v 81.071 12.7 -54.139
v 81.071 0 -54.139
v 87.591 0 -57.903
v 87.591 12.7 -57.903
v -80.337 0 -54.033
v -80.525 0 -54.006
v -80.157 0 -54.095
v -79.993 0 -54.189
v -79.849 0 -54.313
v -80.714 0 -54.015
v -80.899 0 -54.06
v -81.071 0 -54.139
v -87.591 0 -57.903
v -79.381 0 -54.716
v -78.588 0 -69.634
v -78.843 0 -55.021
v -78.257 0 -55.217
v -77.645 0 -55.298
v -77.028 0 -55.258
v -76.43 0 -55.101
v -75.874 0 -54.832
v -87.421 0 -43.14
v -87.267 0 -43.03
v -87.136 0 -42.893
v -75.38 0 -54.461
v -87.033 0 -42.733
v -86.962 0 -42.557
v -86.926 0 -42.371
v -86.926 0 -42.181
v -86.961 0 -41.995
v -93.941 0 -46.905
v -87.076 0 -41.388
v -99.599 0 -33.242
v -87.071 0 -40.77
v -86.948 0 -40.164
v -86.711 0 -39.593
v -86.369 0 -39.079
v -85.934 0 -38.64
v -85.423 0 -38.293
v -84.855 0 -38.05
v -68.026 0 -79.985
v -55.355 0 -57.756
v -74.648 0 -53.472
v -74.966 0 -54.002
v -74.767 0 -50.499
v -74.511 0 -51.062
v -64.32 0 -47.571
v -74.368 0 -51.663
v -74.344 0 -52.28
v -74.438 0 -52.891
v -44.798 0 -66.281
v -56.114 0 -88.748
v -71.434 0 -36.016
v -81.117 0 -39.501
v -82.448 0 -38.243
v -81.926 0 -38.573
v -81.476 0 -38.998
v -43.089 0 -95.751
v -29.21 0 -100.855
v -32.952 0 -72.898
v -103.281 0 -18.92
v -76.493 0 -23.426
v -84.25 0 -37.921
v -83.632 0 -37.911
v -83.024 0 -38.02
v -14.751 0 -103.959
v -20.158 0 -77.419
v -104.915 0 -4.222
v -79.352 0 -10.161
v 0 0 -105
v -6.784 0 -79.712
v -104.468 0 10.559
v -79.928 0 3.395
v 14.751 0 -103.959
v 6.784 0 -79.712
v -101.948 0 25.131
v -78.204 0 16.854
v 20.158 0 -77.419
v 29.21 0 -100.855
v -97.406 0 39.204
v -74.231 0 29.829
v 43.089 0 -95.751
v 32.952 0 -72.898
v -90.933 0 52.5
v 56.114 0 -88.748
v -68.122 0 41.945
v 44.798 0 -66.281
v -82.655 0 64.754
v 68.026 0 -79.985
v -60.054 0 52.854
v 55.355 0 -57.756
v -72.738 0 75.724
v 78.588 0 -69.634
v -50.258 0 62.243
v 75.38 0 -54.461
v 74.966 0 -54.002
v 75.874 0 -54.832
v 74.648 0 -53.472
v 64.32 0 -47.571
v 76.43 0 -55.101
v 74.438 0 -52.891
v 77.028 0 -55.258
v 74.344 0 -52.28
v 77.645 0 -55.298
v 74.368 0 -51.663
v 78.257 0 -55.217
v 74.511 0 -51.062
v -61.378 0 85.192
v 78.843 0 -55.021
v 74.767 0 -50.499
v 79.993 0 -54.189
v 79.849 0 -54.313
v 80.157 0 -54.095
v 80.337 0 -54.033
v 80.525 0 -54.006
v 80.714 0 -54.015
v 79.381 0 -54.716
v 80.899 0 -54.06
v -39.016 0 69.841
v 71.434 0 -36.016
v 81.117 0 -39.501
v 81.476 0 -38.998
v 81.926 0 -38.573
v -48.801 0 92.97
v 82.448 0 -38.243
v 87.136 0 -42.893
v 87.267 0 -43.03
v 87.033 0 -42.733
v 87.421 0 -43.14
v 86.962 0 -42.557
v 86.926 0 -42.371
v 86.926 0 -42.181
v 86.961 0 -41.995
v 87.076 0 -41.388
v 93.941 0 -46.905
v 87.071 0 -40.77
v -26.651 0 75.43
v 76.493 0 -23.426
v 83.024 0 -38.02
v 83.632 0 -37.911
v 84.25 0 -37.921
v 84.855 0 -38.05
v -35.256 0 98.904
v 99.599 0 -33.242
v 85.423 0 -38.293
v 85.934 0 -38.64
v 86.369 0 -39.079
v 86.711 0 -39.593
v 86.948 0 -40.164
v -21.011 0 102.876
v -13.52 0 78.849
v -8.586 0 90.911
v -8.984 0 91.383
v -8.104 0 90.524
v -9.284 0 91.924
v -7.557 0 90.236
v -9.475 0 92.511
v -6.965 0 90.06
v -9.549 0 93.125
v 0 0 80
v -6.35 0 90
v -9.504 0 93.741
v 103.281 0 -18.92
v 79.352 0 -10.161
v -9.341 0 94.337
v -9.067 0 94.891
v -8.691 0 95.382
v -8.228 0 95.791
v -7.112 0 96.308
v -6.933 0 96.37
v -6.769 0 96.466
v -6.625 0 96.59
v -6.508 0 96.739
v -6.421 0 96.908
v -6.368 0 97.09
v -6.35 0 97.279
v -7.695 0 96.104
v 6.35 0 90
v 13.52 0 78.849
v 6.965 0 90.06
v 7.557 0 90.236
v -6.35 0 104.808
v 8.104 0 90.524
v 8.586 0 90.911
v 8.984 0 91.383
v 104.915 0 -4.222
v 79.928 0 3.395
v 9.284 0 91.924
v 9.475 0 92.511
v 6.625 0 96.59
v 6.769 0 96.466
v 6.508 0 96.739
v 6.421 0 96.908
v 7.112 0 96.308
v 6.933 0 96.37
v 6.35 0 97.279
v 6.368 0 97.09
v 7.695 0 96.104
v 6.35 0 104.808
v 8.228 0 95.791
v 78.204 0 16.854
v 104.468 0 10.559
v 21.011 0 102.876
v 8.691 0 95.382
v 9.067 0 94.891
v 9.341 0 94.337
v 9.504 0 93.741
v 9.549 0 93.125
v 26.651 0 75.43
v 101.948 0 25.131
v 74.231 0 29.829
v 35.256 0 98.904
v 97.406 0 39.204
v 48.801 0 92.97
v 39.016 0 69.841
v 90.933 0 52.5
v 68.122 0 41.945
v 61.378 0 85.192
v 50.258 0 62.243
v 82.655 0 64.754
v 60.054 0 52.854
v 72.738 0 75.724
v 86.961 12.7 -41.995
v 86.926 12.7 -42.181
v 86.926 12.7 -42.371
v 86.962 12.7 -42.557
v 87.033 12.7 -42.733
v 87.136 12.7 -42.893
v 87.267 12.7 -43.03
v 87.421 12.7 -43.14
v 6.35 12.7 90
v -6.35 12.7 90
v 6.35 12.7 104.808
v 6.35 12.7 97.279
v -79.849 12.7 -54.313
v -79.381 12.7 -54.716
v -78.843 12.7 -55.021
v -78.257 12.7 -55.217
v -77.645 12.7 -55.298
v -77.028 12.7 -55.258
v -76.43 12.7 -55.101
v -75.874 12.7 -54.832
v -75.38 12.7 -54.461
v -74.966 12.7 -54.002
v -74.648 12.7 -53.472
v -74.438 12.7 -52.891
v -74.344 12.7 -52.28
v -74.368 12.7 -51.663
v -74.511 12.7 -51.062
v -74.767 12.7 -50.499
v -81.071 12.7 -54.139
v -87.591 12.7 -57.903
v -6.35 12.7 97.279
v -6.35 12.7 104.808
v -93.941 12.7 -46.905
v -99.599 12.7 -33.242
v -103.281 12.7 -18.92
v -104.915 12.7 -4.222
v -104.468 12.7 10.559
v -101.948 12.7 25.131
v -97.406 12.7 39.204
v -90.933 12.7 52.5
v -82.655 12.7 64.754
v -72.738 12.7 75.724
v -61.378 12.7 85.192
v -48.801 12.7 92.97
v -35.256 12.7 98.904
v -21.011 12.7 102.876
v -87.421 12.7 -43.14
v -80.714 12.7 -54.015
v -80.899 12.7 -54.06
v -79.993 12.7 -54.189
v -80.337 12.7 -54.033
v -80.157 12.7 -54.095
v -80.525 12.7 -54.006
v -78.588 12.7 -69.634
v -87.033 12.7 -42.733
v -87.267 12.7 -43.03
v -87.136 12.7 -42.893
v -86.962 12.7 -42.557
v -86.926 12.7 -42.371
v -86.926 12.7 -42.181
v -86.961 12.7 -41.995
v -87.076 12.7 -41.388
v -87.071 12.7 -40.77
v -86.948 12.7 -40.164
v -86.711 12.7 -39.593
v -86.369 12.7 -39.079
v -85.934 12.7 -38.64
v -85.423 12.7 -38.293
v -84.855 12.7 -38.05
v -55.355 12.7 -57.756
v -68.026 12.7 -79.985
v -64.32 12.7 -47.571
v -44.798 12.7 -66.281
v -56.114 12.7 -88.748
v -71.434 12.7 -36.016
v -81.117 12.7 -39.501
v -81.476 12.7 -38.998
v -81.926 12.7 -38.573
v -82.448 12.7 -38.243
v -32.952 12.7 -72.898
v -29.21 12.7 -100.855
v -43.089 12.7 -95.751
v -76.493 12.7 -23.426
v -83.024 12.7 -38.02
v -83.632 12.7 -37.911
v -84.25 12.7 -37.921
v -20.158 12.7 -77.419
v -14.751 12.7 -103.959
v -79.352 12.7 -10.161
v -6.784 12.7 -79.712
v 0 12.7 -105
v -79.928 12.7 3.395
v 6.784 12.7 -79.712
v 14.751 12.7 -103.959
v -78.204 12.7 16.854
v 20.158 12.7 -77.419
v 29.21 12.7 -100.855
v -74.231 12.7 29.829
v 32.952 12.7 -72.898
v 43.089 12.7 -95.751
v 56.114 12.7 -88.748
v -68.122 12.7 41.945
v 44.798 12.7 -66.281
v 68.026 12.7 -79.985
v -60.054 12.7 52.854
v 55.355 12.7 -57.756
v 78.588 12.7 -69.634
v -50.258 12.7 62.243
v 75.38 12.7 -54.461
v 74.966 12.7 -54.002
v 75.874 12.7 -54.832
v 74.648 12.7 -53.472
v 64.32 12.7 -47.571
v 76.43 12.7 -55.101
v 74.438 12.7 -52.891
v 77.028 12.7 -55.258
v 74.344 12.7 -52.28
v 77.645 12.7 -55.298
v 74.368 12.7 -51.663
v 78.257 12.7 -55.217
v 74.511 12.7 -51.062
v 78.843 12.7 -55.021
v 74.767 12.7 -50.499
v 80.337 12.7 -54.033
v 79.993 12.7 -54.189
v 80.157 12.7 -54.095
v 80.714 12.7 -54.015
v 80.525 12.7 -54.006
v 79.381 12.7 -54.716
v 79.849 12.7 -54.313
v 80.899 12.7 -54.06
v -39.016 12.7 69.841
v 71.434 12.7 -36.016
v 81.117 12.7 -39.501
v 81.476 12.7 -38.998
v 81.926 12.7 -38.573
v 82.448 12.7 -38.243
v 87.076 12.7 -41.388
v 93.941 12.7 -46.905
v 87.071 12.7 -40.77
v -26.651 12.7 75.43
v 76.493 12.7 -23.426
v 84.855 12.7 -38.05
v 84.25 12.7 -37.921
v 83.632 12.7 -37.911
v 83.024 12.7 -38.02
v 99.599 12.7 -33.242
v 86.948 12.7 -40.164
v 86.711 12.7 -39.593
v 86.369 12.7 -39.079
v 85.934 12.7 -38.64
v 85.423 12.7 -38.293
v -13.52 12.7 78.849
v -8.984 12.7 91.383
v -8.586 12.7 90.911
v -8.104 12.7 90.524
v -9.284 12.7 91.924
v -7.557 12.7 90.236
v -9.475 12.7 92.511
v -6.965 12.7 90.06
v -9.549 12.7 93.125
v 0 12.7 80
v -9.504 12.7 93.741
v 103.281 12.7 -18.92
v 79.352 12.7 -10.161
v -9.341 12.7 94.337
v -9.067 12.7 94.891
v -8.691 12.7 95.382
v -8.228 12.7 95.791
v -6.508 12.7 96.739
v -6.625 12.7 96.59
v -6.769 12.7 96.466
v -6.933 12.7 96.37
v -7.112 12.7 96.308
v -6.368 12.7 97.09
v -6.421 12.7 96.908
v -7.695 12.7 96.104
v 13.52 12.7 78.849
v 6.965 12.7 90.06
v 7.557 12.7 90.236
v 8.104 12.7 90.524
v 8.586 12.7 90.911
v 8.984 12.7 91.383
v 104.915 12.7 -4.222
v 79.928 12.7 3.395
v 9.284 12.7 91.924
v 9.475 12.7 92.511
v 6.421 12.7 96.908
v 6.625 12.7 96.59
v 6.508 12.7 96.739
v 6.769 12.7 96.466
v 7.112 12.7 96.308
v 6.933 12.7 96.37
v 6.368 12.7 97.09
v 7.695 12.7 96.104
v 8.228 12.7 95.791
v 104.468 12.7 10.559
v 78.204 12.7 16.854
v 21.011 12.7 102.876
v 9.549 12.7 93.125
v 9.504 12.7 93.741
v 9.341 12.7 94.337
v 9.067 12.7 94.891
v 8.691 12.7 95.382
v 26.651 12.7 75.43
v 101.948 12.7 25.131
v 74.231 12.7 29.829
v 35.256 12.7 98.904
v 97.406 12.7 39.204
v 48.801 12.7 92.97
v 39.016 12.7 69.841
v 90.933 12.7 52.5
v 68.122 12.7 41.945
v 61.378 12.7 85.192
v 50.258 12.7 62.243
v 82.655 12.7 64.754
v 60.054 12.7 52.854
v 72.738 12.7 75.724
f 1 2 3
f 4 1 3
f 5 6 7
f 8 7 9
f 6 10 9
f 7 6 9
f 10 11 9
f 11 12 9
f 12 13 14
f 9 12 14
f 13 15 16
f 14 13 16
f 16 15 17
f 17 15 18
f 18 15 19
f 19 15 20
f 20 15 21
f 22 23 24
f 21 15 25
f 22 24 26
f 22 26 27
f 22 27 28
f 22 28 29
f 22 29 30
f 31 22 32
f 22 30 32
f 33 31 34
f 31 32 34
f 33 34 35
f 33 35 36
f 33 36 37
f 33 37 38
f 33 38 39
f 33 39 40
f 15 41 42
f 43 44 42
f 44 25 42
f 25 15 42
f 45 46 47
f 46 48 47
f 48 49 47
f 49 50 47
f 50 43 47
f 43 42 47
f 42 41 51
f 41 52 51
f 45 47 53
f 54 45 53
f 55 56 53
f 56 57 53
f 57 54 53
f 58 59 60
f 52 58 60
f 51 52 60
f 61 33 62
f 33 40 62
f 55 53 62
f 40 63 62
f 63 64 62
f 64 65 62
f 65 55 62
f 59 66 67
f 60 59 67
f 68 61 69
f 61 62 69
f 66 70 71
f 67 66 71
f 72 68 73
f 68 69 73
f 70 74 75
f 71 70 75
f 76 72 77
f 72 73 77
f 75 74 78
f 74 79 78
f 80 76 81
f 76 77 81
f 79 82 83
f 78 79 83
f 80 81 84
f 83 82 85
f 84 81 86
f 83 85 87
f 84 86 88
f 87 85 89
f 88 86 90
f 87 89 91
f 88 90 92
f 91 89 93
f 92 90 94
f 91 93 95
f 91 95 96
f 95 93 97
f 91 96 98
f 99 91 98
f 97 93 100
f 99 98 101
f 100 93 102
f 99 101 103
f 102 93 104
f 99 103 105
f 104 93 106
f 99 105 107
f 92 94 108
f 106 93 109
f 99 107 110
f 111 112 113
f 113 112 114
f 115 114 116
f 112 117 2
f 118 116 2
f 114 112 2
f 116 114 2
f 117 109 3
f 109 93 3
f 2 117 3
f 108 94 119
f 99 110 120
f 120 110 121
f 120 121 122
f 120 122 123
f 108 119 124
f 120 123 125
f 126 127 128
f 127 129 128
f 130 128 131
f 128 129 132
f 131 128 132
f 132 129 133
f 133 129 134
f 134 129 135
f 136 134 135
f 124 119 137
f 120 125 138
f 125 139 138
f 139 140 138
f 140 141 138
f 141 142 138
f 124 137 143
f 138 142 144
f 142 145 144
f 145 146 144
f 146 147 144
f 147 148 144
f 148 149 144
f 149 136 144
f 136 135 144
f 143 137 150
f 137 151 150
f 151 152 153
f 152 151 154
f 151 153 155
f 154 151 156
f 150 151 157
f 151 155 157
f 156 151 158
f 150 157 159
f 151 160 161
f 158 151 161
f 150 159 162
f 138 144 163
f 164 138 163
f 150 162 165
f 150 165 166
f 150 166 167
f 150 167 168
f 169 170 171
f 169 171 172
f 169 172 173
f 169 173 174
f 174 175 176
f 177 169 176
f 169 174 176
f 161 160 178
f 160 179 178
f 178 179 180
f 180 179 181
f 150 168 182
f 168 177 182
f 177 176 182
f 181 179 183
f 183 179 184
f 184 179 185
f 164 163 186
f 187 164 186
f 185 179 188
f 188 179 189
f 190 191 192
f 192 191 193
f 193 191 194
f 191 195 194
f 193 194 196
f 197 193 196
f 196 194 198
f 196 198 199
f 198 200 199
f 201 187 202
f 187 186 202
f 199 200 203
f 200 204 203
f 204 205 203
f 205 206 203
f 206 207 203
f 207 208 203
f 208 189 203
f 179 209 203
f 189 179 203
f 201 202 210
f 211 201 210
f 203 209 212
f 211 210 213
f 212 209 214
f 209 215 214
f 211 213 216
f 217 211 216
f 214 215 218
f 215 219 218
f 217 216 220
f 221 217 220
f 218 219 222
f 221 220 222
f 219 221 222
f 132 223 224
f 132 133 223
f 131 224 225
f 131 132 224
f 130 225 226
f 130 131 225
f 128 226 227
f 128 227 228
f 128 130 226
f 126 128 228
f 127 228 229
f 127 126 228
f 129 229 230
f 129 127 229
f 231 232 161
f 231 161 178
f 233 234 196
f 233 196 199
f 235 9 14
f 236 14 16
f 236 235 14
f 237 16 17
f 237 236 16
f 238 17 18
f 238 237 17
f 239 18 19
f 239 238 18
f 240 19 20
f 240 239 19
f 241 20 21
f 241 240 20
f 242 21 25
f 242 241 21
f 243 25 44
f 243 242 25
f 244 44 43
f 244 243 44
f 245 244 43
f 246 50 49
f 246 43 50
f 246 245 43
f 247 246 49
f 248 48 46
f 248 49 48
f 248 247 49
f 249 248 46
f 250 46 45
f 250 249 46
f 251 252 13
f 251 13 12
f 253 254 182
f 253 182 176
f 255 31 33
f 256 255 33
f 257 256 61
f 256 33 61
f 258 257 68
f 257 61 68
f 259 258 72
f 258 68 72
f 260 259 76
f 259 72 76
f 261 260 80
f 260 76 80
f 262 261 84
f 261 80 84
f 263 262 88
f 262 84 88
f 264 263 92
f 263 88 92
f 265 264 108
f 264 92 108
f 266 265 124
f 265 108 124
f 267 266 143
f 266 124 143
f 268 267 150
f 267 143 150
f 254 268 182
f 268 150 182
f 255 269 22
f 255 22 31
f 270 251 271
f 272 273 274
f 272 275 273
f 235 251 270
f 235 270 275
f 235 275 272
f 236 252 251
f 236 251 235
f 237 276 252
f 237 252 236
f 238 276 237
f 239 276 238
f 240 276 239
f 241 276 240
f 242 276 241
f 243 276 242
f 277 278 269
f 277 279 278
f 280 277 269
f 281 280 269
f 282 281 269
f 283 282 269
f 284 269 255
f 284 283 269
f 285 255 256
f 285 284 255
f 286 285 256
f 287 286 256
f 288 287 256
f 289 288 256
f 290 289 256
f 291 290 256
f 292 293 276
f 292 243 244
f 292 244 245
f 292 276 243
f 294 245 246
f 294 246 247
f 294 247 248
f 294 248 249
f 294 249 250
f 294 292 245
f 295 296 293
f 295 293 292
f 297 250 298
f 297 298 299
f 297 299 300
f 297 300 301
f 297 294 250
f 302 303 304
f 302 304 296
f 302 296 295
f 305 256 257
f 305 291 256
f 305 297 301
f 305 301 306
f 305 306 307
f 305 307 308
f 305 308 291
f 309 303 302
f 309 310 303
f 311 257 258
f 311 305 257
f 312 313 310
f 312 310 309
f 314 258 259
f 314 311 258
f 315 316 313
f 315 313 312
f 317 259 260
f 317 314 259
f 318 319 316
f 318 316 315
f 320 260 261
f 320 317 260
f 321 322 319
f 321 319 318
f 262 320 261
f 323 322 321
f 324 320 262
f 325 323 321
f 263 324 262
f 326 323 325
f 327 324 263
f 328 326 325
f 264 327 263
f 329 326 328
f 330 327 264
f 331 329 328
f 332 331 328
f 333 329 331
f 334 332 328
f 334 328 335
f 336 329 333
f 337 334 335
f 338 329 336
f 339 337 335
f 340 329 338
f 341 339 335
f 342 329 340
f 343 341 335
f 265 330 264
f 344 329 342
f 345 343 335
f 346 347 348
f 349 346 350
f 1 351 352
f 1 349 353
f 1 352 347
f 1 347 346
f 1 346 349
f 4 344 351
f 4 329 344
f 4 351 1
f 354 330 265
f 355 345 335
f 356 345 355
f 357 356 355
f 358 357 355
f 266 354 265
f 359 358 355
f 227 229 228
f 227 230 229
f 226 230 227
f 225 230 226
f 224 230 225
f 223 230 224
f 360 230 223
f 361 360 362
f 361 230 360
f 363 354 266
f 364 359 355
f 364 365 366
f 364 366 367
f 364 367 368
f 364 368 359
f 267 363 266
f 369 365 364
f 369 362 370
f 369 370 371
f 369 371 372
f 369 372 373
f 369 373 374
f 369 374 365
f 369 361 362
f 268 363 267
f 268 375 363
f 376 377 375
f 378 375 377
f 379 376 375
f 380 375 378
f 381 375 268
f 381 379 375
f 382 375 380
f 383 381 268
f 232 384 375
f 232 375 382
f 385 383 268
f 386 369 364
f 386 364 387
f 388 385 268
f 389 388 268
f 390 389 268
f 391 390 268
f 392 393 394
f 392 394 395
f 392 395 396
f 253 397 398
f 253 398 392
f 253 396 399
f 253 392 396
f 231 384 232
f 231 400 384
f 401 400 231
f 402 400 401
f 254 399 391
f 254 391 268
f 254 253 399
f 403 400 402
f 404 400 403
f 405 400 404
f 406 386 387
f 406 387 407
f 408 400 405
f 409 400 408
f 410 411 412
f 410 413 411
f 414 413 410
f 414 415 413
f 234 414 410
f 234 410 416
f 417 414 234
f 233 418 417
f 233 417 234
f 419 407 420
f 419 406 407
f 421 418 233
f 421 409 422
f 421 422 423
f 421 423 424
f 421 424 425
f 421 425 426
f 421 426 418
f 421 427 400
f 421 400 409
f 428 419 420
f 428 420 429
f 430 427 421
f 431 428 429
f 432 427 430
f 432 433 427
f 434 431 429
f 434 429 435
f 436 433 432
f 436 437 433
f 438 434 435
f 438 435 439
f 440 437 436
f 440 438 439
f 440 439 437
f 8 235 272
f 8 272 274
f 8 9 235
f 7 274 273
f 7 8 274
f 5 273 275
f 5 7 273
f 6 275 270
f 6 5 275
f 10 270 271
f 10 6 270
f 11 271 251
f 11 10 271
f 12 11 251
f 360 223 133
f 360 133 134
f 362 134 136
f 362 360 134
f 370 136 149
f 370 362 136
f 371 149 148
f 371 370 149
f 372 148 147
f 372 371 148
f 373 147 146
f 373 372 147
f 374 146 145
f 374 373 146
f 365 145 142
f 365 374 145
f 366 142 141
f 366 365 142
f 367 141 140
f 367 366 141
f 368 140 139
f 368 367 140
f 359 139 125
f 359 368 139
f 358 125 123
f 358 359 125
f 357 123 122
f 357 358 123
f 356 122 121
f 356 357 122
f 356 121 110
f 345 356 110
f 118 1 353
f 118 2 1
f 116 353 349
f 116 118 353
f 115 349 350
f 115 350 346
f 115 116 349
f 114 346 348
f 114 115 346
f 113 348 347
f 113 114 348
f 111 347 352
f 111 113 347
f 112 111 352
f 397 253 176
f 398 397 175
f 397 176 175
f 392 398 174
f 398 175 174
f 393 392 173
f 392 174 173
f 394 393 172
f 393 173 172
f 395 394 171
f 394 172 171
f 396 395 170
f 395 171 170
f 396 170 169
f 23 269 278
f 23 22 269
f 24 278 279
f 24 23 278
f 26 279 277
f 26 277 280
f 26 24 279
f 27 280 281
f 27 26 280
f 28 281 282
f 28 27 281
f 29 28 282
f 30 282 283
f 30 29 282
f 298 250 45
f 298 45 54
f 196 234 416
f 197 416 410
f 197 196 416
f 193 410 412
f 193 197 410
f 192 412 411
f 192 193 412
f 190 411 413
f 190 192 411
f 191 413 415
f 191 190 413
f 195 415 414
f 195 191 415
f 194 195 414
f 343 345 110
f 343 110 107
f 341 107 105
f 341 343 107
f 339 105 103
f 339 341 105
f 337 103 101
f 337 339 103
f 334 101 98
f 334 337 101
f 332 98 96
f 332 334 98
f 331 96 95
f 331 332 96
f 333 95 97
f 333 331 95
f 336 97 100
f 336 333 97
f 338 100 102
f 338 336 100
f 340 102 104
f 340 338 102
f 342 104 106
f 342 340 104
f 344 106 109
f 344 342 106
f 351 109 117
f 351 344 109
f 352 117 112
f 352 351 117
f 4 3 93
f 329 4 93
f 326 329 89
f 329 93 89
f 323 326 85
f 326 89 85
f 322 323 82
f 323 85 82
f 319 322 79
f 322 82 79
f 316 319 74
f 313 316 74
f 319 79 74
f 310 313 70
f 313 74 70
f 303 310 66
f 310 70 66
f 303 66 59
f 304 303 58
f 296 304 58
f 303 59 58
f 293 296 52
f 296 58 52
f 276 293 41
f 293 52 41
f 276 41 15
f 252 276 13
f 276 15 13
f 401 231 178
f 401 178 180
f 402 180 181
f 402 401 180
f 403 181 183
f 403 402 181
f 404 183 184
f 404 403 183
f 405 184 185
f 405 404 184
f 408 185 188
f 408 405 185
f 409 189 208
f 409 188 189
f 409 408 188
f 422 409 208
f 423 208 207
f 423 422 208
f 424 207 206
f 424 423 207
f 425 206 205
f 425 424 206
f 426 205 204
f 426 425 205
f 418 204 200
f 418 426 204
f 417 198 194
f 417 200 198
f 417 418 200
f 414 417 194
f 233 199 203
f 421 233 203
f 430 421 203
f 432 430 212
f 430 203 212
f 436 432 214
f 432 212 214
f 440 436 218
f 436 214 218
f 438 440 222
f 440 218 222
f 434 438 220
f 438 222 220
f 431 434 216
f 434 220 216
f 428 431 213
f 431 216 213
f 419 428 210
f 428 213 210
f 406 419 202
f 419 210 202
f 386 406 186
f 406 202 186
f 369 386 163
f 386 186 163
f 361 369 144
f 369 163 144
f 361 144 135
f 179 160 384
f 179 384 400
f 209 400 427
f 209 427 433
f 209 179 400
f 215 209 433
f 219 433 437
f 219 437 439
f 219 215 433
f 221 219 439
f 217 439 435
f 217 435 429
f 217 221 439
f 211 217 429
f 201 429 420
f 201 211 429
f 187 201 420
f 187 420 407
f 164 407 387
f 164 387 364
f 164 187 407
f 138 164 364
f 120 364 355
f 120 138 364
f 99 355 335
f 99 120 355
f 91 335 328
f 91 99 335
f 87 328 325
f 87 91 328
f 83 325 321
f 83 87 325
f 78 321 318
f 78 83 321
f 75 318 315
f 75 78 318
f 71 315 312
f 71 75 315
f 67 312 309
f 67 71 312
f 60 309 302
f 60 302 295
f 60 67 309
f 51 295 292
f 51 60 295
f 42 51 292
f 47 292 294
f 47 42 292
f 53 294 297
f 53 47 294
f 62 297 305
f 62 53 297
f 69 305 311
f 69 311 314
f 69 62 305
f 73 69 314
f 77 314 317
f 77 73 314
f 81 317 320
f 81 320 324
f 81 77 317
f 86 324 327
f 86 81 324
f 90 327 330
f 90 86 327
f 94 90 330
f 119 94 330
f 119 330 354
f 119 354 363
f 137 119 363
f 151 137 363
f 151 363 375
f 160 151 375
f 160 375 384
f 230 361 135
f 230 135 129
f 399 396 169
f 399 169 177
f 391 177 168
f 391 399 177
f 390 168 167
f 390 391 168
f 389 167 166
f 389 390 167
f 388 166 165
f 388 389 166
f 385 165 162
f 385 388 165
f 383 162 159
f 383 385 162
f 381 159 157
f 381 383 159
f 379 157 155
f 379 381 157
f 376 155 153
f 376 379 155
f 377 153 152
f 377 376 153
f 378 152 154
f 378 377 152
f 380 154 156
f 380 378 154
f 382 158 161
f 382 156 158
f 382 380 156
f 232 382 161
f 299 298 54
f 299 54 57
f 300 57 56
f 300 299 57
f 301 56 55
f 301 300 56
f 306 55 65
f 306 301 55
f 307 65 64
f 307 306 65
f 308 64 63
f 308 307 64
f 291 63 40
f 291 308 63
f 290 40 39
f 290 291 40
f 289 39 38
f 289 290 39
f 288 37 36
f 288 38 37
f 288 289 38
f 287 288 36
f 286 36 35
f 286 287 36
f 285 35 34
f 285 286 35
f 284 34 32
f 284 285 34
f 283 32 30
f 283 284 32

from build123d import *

# Parameters (mm, degrees)
SKETCH1_R                = 105
SKETCH1_R_2              = 80
BOSS_EXTRUDE1_DEPTH      = 12.7
CUT_EXTRUDE1_DEPTH       = 150.034526201
FILLET1_R                = 1
CIRPATTERN1_COUNT        = 3
FILLET1_OF_CIRPATTERN1_R = 1


with BuildPart() as part:
    # Sketch1 → Boss-Extrude1 (new body)
    with BuildSketch(Plane(origin=(0, 0, 0), x_dir=(1, 0, 0), z_dir=(0, 1, 0))):
        with Locations(Location((0, 0, 0), (0, 0, 270))):
            Circle(SKETCH1_R)
        with Locations(Location((0, 0, 0), (0, 0, 270))):
            Circle(SKETCH1_R_2, mode=Mode.SUBTRACT)
    extrude(amount=BOSS_EXTRUDE1_DEPTH)

    # Sketch2 → Cut-Extrude1 (cut, through all)
    with BuildSketch(Plane(origin=(0, 12.7, 0), x_dir=(1, 0, 0), z_dir=(0, 1, 0))):
        with BuildLine():
            Line((6.35, -105), (-6.35, -105))
            Line((-6.35, -105), (-6.35, -96.4))
            ThreePointArc((-6.35, -96.4), (-9.55, -93.2), (-6.35, -90))
            Line((-6.35, -90), (6.35, -90))
            ThreePointArc((6.35, -90), (9.55, -93.2), (6.35, -96.4))
            Line((6.35, -96.4), (6.35, -105))
        make_face()
    cut_extrude1 = extrude(amount=-CUT_EXTRUDE1_DEPTH, mode=Mode.SUBTRACT)

    # Fillet1
    fillet1_edges = [part.edges().sort_by_distance(p)[0] for p in [
        (6.35, 6.35, 96.4),
        (-6.35, 6.35, 96.4),
    ]]
    fillet(fillet1_edges, radius=FILLET1_R)

    # CirPattern1: Cut-Extrude1 ×3 about axis
    cirpattern1_axis = Axis((0, 0, 0), (0, 1, 0))
    for i in range(1, CIRPATTERN1_COUNT):
        add(cut_extrude1.rotate(cirpattern1_axis, i * 360 / CIRPATTERN1_COUNT), mode=Mode.SUBTRACT)

    # Fillet1 of CirPattern1
    fillet1_of_cirpattern1_edges = [part.edges().sort_by_distance(p)[0] for p in [
        (80.309848925, 6.35, -53.699261314),
        (86.659848925, 6.35, -42.700738686),
        (-86.659848925, 6.35, -42.700738686),
        (-80.309848925, 6.35, -53.699261314),
    ]]
    fillet(fillet1_of_cirpattern1_edges, radius=FILLET1_OF_CIRPATTERN1_R)


solid = part.part
